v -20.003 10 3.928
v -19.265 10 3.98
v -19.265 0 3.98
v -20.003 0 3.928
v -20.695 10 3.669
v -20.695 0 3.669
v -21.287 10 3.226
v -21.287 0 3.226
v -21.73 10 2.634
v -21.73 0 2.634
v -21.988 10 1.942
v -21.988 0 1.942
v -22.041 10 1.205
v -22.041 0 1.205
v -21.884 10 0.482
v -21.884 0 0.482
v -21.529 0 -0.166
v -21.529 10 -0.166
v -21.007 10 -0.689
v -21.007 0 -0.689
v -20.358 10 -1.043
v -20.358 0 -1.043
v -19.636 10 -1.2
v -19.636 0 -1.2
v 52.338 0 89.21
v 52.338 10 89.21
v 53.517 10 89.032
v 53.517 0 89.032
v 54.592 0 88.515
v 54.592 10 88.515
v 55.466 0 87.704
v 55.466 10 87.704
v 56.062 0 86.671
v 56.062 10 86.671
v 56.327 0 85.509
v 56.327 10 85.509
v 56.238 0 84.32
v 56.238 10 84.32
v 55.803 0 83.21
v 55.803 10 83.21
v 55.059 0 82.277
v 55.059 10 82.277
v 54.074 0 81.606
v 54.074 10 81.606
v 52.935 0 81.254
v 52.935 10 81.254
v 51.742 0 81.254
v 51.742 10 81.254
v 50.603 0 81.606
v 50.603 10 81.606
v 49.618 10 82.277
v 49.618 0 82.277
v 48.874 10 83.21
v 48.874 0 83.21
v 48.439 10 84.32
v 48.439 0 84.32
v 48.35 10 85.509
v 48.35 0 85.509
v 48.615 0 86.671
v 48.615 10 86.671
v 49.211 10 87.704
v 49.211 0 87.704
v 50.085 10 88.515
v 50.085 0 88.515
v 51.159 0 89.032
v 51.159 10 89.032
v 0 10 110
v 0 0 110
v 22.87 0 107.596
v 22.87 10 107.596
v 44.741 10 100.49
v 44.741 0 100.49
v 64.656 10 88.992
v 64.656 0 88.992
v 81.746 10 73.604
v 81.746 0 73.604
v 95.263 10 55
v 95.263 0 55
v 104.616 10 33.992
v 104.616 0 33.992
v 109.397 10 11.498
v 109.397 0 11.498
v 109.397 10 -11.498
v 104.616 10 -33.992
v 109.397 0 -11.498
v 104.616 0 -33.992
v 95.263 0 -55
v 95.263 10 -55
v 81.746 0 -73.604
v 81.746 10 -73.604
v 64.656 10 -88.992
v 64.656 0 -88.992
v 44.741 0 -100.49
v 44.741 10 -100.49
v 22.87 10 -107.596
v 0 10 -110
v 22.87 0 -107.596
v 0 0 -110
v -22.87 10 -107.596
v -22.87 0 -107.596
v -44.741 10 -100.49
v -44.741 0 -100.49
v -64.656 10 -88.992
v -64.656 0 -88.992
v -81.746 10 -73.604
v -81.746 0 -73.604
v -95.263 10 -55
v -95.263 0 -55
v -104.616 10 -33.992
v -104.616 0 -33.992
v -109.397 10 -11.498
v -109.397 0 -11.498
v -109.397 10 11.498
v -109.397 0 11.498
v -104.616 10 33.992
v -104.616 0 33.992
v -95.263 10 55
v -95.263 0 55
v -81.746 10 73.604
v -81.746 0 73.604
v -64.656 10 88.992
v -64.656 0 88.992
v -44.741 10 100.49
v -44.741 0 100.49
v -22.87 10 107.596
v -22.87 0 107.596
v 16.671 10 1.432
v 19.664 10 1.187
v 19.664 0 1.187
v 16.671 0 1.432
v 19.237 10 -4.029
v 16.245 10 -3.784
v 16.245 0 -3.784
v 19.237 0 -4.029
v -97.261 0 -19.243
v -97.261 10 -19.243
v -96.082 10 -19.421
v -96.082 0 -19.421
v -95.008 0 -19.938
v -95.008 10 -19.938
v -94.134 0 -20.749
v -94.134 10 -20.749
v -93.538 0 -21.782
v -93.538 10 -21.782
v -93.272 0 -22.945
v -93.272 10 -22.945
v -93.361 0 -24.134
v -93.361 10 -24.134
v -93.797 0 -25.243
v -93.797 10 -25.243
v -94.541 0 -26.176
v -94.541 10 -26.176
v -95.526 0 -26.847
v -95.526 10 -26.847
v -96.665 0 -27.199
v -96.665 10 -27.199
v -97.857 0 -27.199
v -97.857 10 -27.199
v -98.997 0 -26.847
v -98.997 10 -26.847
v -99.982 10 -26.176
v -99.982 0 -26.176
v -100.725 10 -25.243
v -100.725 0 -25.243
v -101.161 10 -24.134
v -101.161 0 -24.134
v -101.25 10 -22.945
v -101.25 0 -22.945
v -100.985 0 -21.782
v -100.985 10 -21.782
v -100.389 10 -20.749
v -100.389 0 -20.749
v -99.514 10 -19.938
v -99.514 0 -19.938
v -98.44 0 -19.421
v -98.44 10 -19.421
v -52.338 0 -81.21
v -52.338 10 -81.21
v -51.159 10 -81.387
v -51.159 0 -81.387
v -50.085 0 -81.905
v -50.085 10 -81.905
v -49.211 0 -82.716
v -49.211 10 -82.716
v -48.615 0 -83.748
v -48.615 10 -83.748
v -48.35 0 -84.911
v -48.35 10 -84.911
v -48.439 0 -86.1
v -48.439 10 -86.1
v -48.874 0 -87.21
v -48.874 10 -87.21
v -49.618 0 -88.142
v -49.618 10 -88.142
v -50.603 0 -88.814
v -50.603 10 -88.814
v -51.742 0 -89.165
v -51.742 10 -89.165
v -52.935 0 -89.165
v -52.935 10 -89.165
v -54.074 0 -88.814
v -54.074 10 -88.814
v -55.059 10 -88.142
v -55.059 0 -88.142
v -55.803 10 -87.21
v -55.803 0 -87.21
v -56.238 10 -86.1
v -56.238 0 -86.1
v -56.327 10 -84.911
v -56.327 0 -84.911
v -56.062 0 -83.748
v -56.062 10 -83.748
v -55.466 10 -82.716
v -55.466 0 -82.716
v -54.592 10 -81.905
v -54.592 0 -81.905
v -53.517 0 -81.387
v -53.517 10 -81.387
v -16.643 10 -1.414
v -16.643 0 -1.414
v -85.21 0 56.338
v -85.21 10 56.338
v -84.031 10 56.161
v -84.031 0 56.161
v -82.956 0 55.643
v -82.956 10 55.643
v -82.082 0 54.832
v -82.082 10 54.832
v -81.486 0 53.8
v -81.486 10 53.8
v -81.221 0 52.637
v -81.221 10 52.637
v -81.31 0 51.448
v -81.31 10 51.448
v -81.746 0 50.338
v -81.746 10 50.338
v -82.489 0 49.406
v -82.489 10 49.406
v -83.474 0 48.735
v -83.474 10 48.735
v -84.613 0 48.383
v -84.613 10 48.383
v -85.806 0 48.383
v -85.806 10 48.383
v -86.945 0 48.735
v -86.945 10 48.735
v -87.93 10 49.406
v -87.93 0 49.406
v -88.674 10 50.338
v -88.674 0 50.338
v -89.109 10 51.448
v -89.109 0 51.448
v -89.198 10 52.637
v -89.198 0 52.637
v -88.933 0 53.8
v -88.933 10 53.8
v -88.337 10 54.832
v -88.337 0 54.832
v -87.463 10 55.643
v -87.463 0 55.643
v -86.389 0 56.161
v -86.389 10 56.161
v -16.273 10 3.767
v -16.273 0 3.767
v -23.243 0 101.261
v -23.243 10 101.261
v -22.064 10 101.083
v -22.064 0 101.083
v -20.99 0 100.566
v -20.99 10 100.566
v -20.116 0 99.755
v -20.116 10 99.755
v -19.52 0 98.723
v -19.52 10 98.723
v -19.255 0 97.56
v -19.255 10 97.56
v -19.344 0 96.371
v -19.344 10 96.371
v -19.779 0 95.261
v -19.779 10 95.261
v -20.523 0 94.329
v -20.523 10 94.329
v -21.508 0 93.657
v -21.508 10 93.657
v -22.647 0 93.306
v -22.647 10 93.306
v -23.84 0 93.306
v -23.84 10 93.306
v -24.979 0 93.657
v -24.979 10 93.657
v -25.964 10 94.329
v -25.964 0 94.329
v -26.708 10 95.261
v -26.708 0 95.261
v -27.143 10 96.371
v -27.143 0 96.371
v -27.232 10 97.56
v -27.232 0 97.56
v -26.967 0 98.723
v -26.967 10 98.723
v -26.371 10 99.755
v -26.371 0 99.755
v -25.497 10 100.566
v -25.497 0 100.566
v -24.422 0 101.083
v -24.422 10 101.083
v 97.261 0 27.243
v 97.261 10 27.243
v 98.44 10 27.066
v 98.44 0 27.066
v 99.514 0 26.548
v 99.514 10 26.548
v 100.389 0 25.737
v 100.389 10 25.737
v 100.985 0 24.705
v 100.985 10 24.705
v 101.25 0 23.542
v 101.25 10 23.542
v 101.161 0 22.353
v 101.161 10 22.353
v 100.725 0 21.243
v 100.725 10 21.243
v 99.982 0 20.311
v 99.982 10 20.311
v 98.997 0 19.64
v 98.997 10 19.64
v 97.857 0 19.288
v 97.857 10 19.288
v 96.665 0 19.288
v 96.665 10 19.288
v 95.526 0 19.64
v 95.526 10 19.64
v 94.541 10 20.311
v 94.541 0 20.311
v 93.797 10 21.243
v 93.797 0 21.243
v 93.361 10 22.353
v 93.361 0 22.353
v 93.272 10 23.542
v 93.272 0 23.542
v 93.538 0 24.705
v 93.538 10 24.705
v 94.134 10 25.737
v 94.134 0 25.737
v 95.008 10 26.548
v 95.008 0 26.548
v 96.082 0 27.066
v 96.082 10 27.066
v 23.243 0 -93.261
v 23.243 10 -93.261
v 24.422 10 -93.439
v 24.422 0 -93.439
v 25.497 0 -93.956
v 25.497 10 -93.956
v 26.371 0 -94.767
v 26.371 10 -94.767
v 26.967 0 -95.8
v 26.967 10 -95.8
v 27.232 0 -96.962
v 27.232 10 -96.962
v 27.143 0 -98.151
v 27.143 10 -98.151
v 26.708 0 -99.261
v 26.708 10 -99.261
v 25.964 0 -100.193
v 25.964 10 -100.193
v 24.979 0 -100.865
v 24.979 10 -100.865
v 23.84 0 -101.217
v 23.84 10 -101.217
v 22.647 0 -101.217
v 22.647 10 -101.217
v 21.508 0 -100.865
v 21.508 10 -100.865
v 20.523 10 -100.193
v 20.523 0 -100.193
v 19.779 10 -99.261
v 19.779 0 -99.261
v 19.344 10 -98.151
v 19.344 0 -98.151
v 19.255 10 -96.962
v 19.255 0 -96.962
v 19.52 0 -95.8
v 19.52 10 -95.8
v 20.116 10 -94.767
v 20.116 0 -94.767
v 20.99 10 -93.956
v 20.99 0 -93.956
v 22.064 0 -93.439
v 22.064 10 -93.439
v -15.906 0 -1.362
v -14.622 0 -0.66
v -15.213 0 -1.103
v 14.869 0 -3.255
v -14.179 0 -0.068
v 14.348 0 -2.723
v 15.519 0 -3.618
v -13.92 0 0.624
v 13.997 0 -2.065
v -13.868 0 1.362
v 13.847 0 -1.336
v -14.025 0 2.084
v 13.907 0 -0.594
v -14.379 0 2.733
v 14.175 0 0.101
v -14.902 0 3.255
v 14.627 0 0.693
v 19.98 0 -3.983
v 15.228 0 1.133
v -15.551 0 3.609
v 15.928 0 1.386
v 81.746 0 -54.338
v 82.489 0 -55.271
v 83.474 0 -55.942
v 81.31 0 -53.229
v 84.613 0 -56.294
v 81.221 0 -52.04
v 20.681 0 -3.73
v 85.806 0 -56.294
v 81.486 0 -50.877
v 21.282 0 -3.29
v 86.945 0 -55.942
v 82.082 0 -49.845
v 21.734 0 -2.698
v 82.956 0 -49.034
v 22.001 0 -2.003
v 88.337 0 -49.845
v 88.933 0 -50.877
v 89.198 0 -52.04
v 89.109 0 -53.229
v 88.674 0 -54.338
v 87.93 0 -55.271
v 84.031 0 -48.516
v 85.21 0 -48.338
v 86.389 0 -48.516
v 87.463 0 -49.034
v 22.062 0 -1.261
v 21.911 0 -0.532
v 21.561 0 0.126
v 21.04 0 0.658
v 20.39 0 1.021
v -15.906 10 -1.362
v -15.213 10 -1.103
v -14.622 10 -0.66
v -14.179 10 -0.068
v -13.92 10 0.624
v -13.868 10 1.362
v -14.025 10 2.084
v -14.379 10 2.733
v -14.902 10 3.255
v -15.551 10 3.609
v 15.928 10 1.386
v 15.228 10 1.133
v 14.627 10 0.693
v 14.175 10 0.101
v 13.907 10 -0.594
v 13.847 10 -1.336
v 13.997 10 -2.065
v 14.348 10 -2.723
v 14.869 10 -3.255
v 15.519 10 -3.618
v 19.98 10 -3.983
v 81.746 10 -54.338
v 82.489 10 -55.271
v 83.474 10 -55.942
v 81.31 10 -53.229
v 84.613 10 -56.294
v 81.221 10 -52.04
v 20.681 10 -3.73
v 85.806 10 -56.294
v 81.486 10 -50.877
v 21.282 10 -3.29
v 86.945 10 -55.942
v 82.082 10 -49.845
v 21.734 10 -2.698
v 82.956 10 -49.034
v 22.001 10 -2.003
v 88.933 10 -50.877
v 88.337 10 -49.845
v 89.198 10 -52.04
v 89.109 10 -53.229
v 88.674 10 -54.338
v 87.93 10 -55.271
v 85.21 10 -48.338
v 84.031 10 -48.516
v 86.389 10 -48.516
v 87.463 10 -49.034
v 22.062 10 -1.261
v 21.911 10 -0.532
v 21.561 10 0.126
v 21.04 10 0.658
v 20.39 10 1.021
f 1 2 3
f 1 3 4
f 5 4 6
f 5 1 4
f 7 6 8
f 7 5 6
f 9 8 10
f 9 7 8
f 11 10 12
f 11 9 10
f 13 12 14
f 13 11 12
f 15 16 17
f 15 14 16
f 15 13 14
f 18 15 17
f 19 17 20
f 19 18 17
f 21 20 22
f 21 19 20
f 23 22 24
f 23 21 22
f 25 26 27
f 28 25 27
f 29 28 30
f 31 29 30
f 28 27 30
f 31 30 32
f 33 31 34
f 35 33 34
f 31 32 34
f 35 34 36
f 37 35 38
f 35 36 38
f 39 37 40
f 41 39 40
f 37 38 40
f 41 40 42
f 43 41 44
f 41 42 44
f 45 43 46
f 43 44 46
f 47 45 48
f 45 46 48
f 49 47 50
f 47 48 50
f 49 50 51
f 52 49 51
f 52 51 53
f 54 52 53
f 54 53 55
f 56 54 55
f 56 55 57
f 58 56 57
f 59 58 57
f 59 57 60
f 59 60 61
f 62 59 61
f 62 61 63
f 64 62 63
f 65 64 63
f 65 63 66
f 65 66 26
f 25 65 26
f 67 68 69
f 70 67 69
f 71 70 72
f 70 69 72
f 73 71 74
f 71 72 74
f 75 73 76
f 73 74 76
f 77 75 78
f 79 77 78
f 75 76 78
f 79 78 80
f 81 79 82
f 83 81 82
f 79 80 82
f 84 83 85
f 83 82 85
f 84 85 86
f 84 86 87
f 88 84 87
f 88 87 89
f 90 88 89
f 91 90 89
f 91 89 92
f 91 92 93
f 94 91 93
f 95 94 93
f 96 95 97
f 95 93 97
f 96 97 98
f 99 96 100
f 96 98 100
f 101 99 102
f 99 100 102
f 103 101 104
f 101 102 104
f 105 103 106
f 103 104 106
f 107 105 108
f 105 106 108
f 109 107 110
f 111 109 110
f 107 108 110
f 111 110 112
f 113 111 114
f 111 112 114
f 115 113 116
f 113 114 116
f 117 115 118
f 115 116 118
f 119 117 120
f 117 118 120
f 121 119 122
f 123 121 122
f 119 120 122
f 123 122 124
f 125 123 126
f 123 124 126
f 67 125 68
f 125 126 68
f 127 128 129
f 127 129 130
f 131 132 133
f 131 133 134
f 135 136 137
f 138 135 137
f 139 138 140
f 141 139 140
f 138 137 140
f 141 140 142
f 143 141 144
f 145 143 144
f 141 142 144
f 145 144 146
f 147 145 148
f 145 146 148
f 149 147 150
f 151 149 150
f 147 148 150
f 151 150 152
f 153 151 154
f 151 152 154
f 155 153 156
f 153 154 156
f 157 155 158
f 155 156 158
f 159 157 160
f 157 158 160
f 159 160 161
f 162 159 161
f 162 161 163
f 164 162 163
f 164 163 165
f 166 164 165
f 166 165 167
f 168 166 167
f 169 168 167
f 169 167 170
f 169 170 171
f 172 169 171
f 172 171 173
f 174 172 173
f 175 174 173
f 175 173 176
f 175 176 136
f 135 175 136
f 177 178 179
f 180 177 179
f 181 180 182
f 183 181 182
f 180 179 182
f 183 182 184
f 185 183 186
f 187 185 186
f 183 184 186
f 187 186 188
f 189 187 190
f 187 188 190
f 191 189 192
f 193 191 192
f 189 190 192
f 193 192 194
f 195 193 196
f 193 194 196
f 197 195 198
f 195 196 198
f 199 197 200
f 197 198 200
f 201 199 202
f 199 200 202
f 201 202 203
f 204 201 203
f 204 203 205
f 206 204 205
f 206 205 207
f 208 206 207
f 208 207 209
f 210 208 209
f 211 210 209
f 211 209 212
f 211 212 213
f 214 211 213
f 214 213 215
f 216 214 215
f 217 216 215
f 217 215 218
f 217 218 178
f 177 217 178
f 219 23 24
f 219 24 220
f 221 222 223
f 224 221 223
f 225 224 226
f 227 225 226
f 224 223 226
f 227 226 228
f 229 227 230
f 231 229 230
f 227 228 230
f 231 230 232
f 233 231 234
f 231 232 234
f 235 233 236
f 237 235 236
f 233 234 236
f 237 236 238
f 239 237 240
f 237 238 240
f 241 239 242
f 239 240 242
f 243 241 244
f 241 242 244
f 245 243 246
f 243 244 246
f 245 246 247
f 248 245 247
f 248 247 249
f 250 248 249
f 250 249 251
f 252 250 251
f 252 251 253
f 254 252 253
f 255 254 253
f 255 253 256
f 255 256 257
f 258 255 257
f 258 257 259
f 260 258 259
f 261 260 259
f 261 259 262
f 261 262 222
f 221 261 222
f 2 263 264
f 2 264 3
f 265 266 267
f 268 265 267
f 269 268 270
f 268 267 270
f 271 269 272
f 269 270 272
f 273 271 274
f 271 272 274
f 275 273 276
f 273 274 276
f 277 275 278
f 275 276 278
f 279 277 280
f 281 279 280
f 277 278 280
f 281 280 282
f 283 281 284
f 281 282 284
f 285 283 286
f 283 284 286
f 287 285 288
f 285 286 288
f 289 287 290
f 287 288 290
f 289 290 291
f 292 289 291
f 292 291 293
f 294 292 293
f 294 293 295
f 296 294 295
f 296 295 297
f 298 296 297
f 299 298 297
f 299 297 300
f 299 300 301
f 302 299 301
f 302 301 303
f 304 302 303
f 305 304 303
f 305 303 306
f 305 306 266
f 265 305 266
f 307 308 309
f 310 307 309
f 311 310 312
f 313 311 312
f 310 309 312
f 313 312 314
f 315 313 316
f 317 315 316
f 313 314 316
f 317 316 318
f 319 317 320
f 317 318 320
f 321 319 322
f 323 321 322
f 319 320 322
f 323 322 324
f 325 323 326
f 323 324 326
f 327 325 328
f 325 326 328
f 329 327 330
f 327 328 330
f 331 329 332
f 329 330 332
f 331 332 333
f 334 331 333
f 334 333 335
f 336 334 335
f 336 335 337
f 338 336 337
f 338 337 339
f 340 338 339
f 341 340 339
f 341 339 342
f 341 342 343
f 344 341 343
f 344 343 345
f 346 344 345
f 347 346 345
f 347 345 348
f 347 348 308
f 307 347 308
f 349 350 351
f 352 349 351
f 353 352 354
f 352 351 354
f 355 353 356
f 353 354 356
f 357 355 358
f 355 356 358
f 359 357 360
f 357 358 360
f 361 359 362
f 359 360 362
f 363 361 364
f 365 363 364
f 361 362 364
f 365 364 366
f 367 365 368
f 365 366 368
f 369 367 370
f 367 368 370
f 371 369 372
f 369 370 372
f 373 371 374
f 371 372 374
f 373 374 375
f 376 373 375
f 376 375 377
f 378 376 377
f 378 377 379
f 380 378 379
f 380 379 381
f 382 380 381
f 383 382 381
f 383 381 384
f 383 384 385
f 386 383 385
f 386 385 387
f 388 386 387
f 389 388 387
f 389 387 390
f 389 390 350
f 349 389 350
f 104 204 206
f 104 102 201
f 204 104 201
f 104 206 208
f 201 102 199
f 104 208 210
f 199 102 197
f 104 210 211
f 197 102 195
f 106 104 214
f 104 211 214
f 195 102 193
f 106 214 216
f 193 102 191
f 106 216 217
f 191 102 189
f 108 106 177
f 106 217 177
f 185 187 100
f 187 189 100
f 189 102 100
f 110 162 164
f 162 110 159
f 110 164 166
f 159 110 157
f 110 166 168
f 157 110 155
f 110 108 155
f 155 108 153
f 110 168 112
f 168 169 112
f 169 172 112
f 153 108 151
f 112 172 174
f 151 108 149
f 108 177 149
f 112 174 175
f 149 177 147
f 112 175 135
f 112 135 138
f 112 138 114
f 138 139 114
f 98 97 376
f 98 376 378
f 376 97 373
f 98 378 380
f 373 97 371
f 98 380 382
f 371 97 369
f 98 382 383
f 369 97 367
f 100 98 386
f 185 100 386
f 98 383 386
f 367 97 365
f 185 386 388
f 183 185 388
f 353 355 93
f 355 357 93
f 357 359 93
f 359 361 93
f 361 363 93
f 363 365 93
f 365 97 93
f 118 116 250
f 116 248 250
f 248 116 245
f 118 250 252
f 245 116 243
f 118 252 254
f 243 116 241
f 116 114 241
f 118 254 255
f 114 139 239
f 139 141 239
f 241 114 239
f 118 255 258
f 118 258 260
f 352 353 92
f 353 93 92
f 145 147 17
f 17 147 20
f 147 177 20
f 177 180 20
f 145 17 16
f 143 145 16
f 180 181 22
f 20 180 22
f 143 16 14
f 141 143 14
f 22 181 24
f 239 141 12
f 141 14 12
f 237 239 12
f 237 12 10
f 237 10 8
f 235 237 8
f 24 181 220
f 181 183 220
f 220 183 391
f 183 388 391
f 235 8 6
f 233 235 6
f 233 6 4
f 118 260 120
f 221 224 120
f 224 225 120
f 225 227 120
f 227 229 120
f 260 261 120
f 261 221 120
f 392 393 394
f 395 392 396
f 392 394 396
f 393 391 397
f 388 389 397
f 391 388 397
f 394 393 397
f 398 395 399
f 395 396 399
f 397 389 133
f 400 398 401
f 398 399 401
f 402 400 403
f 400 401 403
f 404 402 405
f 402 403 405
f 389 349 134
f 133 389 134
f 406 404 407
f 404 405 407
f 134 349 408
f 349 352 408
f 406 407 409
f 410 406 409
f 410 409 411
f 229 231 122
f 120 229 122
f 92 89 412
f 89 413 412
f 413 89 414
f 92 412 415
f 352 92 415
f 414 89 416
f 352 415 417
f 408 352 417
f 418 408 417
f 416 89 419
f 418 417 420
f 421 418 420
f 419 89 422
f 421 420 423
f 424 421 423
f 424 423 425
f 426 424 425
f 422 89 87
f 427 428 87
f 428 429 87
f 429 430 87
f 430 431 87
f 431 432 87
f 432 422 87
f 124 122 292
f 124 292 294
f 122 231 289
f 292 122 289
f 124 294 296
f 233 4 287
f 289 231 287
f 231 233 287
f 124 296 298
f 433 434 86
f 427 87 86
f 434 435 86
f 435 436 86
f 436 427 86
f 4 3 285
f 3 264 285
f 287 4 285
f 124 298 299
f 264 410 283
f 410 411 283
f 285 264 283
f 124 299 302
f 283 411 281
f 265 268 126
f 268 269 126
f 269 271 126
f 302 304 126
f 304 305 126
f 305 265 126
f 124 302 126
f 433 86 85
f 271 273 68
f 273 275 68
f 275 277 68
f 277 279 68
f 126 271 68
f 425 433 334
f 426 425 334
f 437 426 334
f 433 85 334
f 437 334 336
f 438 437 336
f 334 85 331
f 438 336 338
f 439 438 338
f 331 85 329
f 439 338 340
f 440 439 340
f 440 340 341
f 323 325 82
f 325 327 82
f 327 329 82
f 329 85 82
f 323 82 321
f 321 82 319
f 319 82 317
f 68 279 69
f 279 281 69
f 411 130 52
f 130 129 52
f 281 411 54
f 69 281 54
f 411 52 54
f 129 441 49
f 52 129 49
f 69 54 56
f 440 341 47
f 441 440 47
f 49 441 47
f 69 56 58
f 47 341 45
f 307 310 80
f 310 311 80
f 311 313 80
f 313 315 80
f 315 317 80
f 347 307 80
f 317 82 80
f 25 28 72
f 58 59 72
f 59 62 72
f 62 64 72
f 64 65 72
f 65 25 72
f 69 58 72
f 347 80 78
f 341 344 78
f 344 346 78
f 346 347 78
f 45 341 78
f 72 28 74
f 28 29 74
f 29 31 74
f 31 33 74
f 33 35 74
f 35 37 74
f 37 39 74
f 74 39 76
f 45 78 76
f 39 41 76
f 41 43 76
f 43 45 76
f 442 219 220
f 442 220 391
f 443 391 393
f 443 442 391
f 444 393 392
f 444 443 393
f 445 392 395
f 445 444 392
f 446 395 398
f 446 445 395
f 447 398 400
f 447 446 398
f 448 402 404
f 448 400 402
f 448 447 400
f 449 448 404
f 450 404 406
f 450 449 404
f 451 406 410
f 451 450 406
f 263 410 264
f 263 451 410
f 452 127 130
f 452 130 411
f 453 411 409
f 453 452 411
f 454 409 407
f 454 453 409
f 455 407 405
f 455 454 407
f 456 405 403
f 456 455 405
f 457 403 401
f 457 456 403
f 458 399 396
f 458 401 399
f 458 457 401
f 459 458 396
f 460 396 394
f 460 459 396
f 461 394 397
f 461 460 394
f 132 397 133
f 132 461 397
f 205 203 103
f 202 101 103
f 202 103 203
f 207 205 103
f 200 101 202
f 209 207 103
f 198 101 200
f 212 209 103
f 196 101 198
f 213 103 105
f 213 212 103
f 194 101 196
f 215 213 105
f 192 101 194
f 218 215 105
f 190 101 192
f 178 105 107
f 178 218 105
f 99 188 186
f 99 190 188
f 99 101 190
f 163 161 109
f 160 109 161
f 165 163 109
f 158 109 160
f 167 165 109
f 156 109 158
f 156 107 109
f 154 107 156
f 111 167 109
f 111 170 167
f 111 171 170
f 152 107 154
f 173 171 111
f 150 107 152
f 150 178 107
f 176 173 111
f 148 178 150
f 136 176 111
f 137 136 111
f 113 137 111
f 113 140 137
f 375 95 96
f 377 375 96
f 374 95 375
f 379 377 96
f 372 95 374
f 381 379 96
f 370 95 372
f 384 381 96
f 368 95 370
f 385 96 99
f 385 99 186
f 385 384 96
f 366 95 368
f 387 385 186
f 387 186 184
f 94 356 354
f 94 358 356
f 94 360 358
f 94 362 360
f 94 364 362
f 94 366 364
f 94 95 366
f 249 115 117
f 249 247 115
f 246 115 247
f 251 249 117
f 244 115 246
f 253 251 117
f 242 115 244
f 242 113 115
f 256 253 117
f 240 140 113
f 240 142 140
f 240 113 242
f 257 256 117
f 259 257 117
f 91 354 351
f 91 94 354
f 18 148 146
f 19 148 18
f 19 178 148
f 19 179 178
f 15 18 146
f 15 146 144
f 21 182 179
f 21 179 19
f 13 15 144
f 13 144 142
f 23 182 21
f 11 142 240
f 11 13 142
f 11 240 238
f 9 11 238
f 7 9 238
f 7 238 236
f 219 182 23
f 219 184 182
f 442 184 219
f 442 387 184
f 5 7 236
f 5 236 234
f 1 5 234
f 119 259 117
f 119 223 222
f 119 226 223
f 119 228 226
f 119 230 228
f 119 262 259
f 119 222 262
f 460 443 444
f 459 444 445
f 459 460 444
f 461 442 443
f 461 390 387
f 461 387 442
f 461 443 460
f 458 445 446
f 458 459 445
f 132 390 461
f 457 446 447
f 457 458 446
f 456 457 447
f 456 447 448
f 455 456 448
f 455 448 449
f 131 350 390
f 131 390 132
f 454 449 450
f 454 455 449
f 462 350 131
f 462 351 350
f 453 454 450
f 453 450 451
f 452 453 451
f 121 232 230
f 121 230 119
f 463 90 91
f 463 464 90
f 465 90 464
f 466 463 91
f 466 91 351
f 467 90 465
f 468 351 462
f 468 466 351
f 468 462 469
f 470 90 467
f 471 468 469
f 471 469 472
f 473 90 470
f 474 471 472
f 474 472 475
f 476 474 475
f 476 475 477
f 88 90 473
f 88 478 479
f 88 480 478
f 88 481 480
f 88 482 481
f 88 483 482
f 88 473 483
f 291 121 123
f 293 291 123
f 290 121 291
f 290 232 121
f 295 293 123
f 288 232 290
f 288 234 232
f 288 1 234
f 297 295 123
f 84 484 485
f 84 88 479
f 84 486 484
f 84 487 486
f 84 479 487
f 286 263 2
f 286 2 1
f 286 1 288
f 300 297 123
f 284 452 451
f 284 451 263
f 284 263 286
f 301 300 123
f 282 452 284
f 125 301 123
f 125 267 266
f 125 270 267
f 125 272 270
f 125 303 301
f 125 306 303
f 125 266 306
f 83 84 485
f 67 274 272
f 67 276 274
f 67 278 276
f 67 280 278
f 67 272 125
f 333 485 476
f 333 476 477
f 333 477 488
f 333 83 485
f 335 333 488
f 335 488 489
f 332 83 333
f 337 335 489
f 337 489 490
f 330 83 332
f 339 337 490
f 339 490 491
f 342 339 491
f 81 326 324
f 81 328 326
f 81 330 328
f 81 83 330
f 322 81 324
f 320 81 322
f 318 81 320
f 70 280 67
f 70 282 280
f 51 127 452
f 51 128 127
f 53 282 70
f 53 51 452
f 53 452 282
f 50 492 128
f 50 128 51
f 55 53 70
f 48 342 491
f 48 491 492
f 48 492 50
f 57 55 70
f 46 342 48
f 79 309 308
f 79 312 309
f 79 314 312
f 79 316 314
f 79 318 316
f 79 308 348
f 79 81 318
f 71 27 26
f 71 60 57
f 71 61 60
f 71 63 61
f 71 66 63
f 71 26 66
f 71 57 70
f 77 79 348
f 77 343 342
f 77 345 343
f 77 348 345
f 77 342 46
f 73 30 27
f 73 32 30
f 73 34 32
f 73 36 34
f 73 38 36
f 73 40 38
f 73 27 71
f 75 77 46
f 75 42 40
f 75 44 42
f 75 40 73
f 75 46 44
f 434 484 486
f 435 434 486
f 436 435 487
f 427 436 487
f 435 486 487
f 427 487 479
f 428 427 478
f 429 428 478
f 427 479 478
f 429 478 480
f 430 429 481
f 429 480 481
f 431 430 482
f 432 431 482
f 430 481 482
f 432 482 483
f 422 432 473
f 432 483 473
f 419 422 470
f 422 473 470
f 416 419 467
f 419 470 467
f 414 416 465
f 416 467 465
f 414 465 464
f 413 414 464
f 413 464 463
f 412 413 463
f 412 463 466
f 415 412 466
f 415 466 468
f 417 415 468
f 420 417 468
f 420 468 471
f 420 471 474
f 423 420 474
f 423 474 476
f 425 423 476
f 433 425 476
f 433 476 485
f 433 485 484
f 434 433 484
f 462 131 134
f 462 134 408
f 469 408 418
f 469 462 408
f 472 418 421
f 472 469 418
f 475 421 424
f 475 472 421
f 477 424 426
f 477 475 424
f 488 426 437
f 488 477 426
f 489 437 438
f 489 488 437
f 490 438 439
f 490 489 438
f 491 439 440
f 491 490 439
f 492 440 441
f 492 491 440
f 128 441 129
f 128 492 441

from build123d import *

# Parameters (mm, degrees)
CROQUIS1_R              = 110
SALIENTE_EXTRUIR1_DEPTH = 10
CORTAR_EXTRUIR2_DEPTH   = 156.884572681
CROQUIS5_R              = 4
CORTAR_EXTRUIR3_DEPTH   = 156.884572681


with BuildPart() as part:
    # Croquis1 → Saliente-Extruir1 (new body)
    with BuildSketch(Plane(origin=(0, 0, 0), x_dir=(1, 0, 0), z_dir=(0, 1, 0))):
        with Locations(Location((0, 0, 0), (0, 0, 270))):
            Circle(CROQUIS1_R)
    extrude(amount=SALIENTE_EXTRUIR1_DEPTH)

    # Croquis3 → Cortar-Extruir2 (cut, through all)
    with BuildSketch(Plane(origin=(0, 10, 0), x_dir=(1, 0, 0), z_dir=(0, 1, 0))):
        with BuildLine():
            Line((-19.635517807, 1.200433086), (-16.643149179, 1.41427881))
            ThreePointArc((-16.643149179, 1.41427881), (-13.867597162, -0.991029758), (-16.27290573, -3.766581775))
            Line((-16.27290573, -3.766581775), (-19.265274358, -3.980427499))
            ThreePointArc((-19.265274358, -3.980427499), (-22.040826375, -1.575118931), (-19.635517807, 1.200433086))
        make_face()
        with BuildLine():
            Line((16.244753287, 3.783863744), (19.237121915, 4.028597389))
            ThreePointArc((19.237121915, 4.028597389), (22.058108344, 1.634159295), (19.66367025, -1.186827134))
            Line((19.66367025, -1.186827134), (16.671301622, -1.431560779))
            ThreePointArc((16.671301622, -1.431560779), (13.850315193, 0.962877315), (16.244753287, 3.783863744))
        make_face()
    extrude(amount=-CORTAR_EXTRUIR2_DEPTH, mode=Mode.SUBTRACT)

    # Croquis5 → Cortar-Extruir3 (cut, through all)
    with BuildSketch(Plane(origin=(0, 10, 0), x_dir=(1, 0, 0), z_dir=(0, 1, 0))):
        with Locations(Location((-85.209654188, -52.338464184, 0), (0, 0, 270))):
            Circle(CROQUIS5_R)
        with Locations(Location((-97.26120724, 23.243441358, 0), (0, 0, 270))):
            Circle(CROQUIS5_R)
        with Locations(Location((-52.338464184, 85.209654188, 0), (0, 0, 270))):
            Circle(CROQUIS5_R)
        with Locations(Location((23.243441358, 97.26120724, 0), (0, 0, 270))):
            Circle(CROQUIS5_R)
        with Locations(Location((85.209654188, 52.338464184, 0), (0, 0, 270))):
            Circle(CROQUIS5_R)
        with Locations(Location((97.26120724, -23.243441358, 0), (0, 0, 270))):
            Circle(CROQUIS5_R)
        with Locations(Location((52.338464184, -85.209654188, 0), (0, 0, 270))):
            Circle(CROQUIS5_R)
        with Locations(Location((-23.243441358, -97.26120724, 0), (0, 0, 270))):
            Circle(CROQUIS5_R)
    extrude(amount=-CORTAR_EXTRUIR3_DEPTH, mode=Mode.SUBTRACT)


solid = part.part
